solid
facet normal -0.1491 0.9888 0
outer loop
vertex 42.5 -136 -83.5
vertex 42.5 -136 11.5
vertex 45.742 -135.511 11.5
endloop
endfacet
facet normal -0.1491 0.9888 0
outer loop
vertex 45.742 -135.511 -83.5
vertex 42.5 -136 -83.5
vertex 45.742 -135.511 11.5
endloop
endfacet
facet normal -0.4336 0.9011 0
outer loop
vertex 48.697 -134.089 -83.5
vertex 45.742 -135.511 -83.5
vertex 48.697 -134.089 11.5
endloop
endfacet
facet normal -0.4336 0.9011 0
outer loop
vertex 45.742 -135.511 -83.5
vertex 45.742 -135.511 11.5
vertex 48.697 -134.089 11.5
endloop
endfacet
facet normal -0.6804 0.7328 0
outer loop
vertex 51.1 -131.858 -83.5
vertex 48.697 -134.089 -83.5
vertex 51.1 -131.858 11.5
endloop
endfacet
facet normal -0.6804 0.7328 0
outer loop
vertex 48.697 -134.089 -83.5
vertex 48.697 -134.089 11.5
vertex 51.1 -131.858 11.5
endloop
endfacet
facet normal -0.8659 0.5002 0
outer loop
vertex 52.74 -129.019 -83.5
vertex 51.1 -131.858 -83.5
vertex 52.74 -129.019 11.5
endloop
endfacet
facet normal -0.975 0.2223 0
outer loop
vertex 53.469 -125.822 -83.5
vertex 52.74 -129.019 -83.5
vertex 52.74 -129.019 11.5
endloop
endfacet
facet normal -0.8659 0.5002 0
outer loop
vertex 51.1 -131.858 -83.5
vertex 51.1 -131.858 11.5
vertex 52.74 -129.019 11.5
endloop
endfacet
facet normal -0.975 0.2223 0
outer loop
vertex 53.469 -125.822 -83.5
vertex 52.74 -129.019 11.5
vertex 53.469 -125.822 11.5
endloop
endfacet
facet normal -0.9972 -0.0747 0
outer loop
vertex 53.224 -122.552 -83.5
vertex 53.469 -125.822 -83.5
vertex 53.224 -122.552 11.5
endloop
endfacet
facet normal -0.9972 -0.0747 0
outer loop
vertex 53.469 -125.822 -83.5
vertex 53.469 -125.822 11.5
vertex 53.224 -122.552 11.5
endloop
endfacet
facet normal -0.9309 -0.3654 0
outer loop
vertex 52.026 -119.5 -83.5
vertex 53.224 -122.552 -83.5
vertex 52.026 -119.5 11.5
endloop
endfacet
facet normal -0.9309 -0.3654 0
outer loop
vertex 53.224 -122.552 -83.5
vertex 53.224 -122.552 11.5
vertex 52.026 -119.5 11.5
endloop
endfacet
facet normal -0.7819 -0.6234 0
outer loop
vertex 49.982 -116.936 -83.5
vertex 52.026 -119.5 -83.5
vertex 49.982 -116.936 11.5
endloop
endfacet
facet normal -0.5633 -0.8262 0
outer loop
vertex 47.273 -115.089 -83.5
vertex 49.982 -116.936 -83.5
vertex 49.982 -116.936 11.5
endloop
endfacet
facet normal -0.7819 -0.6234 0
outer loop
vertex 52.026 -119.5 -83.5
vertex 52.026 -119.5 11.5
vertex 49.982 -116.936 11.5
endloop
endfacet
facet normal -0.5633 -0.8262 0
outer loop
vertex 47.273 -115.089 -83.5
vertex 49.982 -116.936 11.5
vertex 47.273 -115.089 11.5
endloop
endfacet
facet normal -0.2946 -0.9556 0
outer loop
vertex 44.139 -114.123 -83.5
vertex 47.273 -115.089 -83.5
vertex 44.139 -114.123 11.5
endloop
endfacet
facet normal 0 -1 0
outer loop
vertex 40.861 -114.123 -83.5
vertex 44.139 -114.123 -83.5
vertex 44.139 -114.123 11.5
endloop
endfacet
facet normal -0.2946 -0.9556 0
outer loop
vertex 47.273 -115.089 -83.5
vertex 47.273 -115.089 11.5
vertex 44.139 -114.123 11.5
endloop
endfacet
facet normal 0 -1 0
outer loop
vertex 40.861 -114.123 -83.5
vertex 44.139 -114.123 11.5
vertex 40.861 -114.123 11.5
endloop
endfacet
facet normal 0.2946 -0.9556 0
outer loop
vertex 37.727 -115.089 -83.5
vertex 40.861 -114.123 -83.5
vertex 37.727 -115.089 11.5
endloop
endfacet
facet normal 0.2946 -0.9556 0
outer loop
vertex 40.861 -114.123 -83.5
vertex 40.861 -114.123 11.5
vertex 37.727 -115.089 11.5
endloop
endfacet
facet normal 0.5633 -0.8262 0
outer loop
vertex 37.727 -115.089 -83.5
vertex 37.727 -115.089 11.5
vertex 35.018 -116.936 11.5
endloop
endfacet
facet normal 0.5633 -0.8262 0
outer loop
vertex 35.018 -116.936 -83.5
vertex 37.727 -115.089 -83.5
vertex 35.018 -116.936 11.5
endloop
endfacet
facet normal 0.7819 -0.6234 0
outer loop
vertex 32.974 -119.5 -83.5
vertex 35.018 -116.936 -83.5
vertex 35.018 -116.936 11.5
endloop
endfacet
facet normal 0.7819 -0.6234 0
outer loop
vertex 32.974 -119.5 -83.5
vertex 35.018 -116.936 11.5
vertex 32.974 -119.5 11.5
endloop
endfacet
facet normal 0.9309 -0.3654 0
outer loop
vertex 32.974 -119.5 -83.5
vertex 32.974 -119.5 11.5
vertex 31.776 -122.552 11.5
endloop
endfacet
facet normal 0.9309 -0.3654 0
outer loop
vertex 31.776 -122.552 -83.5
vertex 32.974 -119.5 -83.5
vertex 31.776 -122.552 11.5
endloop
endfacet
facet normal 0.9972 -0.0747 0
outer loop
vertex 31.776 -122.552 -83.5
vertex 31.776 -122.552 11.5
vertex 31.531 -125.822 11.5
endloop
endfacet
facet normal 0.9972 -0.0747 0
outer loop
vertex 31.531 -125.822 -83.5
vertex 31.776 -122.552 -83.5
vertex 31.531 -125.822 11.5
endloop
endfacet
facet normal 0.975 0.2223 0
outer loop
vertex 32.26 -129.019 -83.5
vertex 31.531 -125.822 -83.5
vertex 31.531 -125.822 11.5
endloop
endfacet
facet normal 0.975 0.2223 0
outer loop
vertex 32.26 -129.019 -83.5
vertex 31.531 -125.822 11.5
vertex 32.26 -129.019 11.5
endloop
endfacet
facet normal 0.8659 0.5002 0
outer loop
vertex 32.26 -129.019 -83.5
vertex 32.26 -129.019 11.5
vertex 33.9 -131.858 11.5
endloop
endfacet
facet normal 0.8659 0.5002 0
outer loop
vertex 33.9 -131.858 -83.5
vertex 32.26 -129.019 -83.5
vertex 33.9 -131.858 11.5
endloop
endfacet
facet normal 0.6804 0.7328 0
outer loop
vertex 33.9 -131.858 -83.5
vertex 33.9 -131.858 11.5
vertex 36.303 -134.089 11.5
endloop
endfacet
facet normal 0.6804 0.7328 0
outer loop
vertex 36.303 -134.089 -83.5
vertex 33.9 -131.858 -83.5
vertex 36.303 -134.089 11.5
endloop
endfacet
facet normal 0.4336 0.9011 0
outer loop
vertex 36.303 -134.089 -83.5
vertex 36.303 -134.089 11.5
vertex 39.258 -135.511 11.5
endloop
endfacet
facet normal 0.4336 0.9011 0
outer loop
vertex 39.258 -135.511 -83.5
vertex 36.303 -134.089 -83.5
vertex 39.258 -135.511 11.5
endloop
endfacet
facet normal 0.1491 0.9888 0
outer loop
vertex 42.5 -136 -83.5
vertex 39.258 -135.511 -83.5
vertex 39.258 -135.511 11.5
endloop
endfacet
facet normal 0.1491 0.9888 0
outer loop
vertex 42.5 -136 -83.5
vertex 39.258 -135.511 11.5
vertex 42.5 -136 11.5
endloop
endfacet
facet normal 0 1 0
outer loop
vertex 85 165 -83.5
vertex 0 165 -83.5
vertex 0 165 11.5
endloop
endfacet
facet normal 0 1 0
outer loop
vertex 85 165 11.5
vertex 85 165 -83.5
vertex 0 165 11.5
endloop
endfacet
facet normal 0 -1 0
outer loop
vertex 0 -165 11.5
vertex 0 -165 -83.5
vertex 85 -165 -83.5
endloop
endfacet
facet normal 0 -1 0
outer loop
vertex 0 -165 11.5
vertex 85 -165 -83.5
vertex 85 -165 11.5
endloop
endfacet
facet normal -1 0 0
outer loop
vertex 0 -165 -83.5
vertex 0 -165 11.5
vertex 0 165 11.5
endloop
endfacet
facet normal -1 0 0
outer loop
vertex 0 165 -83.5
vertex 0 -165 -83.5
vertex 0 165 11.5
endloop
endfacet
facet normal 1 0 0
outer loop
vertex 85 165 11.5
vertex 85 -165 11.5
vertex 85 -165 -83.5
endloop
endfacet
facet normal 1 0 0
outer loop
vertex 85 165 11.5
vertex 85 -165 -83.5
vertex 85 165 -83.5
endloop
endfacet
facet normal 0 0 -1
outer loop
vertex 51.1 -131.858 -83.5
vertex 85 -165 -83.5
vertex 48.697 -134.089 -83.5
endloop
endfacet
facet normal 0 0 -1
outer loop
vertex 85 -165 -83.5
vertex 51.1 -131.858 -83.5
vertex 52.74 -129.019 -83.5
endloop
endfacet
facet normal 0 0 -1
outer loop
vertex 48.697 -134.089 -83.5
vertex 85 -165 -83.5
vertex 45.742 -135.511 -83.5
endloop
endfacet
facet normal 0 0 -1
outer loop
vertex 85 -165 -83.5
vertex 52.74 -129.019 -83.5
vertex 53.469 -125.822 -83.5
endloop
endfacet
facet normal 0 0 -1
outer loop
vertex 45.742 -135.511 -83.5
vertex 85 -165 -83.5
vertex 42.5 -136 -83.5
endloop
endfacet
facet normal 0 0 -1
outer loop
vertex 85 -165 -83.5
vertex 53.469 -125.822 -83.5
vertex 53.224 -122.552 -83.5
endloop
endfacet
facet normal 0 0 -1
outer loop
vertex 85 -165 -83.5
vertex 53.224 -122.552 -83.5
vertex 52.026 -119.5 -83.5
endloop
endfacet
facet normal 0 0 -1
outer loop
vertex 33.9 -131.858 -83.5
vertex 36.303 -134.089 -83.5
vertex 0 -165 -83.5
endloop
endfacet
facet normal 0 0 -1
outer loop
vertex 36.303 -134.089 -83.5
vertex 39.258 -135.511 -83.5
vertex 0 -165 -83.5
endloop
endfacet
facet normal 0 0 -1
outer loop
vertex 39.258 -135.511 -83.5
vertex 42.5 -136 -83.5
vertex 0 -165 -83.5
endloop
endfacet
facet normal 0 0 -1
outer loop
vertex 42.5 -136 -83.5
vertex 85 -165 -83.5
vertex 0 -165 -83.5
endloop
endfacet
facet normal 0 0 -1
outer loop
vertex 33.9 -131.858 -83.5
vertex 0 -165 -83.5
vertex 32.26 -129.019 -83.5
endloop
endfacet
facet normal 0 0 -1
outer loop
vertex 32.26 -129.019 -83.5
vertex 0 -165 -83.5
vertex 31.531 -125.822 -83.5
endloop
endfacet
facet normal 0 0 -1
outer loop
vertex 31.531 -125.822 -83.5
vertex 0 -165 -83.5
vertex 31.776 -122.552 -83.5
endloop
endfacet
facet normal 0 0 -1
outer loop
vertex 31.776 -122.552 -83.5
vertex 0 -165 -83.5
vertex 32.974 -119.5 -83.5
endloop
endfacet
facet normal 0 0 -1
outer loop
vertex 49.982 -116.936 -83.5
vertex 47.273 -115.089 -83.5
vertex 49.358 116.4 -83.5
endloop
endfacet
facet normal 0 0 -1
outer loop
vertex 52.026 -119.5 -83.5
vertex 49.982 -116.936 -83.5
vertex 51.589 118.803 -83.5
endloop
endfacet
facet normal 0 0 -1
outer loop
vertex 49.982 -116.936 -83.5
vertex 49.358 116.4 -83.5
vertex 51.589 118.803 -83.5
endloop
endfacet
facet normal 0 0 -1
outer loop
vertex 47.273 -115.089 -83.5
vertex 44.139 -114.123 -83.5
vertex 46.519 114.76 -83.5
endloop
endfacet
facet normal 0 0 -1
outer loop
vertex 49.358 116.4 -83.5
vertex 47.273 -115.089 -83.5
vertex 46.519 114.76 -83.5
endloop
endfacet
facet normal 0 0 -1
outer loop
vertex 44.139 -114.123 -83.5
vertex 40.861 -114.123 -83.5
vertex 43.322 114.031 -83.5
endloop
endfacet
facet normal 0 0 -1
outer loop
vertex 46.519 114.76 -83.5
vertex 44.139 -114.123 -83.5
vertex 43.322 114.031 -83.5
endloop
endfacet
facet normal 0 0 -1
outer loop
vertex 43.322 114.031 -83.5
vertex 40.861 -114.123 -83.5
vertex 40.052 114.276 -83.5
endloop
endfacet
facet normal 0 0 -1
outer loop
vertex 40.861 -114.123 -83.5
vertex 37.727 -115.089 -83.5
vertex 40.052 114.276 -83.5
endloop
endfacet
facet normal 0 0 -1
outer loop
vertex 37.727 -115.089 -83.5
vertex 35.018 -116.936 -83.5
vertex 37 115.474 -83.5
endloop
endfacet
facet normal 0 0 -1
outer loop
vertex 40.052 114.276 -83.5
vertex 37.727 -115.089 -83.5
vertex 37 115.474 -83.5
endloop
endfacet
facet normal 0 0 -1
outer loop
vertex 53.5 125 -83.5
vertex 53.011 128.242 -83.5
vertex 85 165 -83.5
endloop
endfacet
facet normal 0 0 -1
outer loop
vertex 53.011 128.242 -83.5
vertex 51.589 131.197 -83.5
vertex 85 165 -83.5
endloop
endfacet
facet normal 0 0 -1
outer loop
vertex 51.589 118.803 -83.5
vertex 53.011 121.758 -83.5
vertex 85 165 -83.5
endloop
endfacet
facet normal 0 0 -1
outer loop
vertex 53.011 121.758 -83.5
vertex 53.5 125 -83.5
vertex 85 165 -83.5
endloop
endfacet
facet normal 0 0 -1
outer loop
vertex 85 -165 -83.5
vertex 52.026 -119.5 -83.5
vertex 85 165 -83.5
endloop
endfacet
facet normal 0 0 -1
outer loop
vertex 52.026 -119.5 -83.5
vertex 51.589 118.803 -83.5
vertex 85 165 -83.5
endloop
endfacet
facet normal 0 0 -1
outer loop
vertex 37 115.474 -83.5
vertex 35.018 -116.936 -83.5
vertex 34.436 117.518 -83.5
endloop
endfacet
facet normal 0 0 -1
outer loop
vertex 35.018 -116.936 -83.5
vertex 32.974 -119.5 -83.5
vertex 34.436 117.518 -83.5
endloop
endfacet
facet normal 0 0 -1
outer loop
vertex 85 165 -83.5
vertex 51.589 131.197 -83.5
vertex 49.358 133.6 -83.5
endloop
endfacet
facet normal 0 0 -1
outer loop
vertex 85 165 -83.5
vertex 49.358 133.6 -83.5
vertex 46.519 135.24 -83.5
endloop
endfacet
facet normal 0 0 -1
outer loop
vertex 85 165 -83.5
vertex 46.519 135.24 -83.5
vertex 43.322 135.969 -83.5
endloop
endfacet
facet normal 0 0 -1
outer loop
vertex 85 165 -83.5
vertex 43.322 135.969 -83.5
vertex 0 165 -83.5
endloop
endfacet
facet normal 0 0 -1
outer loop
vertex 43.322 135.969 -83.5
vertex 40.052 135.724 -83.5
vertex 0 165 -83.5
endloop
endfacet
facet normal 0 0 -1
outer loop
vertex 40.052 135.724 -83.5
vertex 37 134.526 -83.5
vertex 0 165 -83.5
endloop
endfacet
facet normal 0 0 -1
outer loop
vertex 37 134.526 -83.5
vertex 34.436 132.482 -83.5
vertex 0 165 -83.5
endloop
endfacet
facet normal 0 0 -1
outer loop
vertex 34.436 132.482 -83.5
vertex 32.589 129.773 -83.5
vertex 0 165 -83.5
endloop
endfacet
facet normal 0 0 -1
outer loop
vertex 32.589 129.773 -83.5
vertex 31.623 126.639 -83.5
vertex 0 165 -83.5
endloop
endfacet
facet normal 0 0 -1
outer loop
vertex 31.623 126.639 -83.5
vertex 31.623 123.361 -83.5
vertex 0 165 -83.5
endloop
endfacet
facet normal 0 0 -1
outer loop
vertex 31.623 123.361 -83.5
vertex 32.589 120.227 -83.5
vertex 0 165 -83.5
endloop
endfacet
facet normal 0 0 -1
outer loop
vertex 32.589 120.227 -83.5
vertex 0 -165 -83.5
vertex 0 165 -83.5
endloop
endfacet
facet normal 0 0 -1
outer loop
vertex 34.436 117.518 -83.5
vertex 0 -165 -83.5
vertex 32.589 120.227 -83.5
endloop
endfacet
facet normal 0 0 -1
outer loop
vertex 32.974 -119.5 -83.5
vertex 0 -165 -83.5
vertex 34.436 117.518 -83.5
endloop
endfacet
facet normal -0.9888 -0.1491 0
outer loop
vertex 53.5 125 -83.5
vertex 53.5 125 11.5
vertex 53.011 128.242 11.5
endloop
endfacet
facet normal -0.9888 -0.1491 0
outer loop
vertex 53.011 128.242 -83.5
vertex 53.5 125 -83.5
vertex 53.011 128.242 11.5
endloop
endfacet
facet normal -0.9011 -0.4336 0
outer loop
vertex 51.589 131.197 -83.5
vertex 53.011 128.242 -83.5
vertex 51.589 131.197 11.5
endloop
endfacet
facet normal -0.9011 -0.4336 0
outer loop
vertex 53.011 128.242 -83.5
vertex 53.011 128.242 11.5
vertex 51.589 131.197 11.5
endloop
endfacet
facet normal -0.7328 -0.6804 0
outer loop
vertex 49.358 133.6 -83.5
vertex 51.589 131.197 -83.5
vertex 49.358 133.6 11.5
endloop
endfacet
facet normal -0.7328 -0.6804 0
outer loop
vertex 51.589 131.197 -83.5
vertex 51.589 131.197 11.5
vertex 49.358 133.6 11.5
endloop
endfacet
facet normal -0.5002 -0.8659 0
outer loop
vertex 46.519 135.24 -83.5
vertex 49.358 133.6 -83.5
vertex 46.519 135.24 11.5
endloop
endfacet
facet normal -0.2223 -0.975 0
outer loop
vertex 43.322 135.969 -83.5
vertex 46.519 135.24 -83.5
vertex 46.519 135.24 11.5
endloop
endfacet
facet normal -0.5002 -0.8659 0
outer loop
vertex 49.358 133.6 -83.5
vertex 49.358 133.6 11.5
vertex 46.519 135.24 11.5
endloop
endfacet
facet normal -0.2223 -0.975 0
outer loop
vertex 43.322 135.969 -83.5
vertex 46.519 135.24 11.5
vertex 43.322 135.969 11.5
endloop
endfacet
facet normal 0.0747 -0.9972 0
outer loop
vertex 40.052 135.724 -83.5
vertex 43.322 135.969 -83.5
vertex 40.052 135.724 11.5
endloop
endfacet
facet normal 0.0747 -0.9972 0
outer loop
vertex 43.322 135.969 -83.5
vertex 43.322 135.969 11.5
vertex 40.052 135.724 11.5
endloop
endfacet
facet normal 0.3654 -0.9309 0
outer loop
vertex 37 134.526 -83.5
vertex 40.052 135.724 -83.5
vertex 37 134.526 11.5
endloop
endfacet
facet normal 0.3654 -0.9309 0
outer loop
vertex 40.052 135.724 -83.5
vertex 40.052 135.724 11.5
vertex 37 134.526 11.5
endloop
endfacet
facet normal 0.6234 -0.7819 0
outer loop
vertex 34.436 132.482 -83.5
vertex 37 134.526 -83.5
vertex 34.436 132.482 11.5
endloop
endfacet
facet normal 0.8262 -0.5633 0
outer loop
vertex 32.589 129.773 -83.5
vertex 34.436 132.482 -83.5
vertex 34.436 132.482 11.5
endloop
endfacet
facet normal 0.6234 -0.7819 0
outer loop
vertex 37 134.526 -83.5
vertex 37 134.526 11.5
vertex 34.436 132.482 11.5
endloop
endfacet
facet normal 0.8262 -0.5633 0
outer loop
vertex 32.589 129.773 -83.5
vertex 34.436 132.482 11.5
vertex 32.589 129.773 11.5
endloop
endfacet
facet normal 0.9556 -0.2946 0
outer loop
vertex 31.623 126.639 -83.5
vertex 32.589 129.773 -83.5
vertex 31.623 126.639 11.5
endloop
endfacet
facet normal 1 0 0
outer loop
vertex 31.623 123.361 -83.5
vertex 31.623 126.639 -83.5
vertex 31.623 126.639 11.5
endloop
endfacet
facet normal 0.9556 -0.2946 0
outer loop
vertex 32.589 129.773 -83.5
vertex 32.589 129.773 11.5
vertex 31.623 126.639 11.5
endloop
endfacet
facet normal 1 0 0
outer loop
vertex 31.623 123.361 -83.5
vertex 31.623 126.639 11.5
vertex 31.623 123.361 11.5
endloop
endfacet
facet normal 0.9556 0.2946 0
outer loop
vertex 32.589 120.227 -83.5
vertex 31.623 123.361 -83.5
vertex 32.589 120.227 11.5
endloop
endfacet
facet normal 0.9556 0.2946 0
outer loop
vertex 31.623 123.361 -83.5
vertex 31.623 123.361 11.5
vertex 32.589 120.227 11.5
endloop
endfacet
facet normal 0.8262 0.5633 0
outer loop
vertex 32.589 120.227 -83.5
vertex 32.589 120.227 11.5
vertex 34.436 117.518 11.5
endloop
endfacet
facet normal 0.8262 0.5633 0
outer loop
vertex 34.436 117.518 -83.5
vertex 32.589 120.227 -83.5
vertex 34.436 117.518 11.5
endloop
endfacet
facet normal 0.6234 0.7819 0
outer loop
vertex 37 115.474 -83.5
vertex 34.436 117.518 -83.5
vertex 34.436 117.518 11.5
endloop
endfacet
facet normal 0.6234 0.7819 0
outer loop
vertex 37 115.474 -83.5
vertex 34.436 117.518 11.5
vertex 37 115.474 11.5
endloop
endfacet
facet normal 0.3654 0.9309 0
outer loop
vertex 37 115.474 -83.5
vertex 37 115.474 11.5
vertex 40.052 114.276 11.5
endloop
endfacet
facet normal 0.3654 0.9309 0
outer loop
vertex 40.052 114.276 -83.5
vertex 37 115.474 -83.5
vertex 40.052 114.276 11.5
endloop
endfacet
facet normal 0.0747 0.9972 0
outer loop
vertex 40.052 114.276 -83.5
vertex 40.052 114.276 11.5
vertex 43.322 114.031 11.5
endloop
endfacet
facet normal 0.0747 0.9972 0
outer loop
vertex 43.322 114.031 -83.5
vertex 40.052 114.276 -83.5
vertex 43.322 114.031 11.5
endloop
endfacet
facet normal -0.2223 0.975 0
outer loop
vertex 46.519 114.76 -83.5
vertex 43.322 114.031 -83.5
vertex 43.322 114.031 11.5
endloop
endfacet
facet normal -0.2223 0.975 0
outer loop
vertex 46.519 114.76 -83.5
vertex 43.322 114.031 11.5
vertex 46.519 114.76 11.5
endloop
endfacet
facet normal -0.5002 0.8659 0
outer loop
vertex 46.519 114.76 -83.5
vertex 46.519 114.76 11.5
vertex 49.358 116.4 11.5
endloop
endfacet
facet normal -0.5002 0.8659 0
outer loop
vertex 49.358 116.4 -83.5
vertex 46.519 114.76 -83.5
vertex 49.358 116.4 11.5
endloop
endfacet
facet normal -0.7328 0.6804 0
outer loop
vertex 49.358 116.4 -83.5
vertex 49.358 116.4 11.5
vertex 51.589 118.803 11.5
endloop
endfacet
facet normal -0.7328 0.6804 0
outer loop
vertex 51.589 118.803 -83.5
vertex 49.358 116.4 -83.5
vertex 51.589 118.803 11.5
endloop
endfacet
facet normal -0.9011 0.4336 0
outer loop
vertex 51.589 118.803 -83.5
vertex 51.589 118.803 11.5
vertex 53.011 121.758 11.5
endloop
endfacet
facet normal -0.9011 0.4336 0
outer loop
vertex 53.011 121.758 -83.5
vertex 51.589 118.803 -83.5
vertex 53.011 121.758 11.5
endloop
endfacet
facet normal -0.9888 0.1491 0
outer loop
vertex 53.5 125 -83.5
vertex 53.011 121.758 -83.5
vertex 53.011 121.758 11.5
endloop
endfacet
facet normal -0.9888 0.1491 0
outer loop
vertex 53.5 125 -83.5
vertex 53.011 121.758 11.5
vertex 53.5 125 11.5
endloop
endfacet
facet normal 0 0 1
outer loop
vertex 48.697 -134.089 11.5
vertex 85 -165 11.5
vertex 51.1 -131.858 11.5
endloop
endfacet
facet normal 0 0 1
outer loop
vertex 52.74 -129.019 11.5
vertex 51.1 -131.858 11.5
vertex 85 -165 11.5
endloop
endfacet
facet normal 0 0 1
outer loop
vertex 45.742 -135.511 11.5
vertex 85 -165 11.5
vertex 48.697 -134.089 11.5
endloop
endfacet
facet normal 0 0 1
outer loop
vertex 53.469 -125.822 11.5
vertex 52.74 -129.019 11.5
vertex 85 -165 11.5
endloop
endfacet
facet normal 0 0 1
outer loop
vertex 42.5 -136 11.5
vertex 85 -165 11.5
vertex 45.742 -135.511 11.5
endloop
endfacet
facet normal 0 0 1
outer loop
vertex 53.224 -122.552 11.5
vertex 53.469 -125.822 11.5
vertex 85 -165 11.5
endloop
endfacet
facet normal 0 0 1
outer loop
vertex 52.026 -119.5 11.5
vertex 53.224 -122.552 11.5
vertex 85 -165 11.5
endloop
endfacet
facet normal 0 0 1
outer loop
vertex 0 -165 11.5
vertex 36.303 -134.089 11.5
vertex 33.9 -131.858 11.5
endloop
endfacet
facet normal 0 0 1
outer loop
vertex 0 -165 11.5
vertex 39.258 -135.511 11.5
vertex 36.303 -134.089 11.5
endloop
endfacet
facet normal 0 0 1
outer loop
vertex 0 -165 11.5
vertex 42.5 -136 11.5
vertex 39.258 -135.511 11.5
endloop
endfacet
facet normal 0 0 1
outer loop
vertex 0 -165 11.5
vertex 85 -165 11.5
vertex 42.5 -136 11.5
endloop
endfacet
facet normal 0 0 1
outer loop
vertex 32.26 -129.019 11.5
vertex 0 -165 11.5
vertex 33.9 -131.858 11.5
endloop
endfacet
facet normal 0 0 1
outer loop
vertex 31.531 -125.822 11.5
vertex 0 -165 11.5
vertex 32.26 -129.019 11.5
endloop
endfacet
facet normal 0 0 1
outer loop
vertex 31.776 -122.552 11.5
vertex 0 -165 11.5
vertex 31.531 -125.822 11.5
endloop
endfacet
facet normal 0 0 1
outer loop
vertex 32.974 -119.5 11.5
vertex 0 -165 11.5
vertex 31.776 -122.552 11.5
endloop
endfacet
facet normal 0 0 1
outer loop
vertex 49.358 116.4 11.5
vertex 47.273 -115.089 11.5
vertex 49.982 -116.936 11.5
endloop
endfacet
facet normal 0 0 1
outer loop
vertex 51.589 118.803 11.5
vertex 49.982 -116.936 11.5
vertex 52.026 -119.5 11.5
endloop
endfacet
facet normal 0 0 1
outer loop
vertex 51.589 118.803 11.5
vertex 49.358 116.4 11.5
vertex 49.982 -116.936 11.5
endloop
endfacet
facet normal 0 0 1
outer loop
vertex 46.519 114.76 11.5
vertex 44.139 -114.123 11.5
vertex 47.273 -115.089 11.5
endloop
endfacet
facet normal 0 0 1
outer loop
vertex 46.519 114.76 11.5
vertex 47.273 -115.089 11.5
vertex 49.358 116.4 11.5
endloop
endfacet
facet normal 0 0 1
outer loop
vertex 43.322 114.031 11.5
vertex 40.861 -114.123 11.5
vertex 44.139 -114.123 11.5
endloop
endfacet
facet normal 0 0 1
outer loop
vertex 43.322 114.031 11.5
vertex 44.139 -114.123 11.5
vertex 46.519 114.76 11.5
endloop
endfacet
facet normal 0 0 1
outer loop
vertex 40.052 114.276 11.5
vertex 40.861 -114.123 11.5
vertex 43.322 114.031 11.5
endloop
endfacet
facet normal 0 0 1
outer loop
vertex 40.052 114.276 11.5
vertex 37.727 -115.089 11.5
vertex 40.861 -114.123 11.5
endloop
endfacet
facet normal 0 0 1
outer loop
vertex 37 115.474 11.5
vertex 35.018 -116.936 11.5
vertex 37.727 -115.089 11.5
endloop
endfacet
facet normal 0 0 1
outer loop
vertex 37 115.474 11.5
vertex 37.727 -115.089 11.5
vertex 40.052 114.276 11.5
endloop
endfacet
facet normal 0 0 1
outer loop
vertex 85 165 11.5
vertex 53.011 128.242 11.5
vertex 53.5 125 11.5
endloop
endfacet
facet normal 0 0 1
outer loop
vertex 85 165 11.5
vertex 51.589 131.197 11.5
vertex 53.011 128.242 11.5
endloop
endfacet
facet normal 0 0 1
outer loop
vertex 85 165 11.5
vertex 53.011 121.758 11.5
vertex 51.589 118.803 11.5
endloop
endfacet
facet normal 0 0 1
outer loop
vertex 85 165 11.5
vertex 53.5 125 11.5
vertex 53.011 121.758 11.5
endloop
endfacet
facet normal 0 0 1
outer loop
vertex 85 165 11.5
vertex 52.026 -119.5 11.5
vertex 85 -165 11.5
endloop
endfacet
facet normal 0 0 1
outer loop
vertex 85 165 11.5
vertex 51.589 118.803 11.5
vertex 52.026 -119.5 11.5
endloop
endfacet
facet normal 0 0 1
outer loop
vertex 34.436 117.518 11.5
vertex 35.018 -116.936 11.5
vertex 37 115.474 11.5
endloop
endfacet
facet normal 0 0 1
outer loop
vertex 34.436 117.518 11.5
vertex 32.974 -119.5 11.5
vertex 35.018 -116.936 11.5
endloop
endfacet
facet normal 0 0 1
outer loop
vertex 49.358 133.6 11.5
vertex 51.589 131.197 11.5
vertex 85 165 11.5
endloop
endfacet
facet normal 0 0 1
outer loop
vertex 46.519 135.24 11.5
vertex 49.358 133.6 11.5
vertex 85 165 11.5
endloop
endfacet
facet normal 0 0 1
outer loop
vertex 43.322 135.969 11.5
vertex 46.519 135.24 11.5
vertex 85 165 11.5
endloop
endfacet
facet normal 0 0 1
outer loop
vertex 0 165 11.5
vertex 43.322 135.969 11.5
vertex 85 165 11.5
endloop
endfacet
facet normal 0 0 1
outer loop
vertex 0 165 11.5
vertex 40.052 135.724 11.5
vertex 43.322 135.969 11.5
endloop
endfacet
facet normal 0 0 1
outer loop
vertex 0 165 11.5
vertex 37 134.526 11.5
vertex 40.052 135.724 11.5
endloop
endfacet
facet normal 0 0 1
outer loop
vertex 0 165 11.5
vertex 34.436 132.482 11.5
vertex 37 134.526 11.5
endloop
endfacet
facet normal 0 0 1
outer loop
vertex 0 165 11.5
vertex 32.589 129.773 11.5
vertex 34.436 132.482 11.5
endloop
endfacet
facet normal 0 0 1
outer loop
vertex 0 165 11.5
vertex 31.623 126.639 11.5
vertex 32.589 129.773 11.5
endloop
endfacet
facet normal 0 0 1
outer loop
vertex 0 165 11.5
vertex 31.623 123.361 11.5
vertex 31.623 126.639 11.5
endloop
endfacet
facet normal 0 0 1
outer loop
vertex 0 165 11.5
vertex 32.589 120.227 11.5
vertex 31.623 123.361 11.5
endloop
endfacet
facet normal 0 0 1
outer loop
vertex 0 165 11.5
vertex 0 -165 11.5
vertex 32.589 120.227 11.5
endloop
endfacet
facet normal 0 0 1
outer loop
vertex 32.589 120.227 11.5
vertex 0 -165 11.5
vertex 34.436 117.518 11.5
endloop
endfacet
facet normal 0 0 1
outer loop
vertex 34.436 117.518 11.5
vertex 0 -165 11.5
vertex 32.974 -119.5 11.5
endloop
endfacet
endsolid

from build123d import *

# Parameters (mm, degrees)
SKETCH1_W           = 330
SKETCH1_H           = 95
BOSS_EXTRUDE1_DEPTH = 85
SKETCH3_R           = 11
CUT_EXTRUDE2_DEPTH  = 150


with BuildPart() as part:
    # Sketch1 → Boss-Extrude1 (new body)
    with BuildSketch(Plane.YZ):
        with Locations((0, -36)):
            Rectangle(SKETCH1_W, SKETCH1_H)
    extrude(amount=BOSS_EXTRUDE1_DEPTH)

    # Sketch3 → Cut-Extrude2 (cut)
    with BuildSketch(Plane.XY.offset(11.5)):
        with Locations((42.5, 125)):
            Circle(SKETCH3_R)
        with Locations(Location((42.5, -125, 0), (0, 0, 270))):
            Circle(SKETCH3_R)
    extrude(amount=-CUT_EXTRUDE2_DEPTH, mode=Mode.SUBTRACT)


solid = part.part
